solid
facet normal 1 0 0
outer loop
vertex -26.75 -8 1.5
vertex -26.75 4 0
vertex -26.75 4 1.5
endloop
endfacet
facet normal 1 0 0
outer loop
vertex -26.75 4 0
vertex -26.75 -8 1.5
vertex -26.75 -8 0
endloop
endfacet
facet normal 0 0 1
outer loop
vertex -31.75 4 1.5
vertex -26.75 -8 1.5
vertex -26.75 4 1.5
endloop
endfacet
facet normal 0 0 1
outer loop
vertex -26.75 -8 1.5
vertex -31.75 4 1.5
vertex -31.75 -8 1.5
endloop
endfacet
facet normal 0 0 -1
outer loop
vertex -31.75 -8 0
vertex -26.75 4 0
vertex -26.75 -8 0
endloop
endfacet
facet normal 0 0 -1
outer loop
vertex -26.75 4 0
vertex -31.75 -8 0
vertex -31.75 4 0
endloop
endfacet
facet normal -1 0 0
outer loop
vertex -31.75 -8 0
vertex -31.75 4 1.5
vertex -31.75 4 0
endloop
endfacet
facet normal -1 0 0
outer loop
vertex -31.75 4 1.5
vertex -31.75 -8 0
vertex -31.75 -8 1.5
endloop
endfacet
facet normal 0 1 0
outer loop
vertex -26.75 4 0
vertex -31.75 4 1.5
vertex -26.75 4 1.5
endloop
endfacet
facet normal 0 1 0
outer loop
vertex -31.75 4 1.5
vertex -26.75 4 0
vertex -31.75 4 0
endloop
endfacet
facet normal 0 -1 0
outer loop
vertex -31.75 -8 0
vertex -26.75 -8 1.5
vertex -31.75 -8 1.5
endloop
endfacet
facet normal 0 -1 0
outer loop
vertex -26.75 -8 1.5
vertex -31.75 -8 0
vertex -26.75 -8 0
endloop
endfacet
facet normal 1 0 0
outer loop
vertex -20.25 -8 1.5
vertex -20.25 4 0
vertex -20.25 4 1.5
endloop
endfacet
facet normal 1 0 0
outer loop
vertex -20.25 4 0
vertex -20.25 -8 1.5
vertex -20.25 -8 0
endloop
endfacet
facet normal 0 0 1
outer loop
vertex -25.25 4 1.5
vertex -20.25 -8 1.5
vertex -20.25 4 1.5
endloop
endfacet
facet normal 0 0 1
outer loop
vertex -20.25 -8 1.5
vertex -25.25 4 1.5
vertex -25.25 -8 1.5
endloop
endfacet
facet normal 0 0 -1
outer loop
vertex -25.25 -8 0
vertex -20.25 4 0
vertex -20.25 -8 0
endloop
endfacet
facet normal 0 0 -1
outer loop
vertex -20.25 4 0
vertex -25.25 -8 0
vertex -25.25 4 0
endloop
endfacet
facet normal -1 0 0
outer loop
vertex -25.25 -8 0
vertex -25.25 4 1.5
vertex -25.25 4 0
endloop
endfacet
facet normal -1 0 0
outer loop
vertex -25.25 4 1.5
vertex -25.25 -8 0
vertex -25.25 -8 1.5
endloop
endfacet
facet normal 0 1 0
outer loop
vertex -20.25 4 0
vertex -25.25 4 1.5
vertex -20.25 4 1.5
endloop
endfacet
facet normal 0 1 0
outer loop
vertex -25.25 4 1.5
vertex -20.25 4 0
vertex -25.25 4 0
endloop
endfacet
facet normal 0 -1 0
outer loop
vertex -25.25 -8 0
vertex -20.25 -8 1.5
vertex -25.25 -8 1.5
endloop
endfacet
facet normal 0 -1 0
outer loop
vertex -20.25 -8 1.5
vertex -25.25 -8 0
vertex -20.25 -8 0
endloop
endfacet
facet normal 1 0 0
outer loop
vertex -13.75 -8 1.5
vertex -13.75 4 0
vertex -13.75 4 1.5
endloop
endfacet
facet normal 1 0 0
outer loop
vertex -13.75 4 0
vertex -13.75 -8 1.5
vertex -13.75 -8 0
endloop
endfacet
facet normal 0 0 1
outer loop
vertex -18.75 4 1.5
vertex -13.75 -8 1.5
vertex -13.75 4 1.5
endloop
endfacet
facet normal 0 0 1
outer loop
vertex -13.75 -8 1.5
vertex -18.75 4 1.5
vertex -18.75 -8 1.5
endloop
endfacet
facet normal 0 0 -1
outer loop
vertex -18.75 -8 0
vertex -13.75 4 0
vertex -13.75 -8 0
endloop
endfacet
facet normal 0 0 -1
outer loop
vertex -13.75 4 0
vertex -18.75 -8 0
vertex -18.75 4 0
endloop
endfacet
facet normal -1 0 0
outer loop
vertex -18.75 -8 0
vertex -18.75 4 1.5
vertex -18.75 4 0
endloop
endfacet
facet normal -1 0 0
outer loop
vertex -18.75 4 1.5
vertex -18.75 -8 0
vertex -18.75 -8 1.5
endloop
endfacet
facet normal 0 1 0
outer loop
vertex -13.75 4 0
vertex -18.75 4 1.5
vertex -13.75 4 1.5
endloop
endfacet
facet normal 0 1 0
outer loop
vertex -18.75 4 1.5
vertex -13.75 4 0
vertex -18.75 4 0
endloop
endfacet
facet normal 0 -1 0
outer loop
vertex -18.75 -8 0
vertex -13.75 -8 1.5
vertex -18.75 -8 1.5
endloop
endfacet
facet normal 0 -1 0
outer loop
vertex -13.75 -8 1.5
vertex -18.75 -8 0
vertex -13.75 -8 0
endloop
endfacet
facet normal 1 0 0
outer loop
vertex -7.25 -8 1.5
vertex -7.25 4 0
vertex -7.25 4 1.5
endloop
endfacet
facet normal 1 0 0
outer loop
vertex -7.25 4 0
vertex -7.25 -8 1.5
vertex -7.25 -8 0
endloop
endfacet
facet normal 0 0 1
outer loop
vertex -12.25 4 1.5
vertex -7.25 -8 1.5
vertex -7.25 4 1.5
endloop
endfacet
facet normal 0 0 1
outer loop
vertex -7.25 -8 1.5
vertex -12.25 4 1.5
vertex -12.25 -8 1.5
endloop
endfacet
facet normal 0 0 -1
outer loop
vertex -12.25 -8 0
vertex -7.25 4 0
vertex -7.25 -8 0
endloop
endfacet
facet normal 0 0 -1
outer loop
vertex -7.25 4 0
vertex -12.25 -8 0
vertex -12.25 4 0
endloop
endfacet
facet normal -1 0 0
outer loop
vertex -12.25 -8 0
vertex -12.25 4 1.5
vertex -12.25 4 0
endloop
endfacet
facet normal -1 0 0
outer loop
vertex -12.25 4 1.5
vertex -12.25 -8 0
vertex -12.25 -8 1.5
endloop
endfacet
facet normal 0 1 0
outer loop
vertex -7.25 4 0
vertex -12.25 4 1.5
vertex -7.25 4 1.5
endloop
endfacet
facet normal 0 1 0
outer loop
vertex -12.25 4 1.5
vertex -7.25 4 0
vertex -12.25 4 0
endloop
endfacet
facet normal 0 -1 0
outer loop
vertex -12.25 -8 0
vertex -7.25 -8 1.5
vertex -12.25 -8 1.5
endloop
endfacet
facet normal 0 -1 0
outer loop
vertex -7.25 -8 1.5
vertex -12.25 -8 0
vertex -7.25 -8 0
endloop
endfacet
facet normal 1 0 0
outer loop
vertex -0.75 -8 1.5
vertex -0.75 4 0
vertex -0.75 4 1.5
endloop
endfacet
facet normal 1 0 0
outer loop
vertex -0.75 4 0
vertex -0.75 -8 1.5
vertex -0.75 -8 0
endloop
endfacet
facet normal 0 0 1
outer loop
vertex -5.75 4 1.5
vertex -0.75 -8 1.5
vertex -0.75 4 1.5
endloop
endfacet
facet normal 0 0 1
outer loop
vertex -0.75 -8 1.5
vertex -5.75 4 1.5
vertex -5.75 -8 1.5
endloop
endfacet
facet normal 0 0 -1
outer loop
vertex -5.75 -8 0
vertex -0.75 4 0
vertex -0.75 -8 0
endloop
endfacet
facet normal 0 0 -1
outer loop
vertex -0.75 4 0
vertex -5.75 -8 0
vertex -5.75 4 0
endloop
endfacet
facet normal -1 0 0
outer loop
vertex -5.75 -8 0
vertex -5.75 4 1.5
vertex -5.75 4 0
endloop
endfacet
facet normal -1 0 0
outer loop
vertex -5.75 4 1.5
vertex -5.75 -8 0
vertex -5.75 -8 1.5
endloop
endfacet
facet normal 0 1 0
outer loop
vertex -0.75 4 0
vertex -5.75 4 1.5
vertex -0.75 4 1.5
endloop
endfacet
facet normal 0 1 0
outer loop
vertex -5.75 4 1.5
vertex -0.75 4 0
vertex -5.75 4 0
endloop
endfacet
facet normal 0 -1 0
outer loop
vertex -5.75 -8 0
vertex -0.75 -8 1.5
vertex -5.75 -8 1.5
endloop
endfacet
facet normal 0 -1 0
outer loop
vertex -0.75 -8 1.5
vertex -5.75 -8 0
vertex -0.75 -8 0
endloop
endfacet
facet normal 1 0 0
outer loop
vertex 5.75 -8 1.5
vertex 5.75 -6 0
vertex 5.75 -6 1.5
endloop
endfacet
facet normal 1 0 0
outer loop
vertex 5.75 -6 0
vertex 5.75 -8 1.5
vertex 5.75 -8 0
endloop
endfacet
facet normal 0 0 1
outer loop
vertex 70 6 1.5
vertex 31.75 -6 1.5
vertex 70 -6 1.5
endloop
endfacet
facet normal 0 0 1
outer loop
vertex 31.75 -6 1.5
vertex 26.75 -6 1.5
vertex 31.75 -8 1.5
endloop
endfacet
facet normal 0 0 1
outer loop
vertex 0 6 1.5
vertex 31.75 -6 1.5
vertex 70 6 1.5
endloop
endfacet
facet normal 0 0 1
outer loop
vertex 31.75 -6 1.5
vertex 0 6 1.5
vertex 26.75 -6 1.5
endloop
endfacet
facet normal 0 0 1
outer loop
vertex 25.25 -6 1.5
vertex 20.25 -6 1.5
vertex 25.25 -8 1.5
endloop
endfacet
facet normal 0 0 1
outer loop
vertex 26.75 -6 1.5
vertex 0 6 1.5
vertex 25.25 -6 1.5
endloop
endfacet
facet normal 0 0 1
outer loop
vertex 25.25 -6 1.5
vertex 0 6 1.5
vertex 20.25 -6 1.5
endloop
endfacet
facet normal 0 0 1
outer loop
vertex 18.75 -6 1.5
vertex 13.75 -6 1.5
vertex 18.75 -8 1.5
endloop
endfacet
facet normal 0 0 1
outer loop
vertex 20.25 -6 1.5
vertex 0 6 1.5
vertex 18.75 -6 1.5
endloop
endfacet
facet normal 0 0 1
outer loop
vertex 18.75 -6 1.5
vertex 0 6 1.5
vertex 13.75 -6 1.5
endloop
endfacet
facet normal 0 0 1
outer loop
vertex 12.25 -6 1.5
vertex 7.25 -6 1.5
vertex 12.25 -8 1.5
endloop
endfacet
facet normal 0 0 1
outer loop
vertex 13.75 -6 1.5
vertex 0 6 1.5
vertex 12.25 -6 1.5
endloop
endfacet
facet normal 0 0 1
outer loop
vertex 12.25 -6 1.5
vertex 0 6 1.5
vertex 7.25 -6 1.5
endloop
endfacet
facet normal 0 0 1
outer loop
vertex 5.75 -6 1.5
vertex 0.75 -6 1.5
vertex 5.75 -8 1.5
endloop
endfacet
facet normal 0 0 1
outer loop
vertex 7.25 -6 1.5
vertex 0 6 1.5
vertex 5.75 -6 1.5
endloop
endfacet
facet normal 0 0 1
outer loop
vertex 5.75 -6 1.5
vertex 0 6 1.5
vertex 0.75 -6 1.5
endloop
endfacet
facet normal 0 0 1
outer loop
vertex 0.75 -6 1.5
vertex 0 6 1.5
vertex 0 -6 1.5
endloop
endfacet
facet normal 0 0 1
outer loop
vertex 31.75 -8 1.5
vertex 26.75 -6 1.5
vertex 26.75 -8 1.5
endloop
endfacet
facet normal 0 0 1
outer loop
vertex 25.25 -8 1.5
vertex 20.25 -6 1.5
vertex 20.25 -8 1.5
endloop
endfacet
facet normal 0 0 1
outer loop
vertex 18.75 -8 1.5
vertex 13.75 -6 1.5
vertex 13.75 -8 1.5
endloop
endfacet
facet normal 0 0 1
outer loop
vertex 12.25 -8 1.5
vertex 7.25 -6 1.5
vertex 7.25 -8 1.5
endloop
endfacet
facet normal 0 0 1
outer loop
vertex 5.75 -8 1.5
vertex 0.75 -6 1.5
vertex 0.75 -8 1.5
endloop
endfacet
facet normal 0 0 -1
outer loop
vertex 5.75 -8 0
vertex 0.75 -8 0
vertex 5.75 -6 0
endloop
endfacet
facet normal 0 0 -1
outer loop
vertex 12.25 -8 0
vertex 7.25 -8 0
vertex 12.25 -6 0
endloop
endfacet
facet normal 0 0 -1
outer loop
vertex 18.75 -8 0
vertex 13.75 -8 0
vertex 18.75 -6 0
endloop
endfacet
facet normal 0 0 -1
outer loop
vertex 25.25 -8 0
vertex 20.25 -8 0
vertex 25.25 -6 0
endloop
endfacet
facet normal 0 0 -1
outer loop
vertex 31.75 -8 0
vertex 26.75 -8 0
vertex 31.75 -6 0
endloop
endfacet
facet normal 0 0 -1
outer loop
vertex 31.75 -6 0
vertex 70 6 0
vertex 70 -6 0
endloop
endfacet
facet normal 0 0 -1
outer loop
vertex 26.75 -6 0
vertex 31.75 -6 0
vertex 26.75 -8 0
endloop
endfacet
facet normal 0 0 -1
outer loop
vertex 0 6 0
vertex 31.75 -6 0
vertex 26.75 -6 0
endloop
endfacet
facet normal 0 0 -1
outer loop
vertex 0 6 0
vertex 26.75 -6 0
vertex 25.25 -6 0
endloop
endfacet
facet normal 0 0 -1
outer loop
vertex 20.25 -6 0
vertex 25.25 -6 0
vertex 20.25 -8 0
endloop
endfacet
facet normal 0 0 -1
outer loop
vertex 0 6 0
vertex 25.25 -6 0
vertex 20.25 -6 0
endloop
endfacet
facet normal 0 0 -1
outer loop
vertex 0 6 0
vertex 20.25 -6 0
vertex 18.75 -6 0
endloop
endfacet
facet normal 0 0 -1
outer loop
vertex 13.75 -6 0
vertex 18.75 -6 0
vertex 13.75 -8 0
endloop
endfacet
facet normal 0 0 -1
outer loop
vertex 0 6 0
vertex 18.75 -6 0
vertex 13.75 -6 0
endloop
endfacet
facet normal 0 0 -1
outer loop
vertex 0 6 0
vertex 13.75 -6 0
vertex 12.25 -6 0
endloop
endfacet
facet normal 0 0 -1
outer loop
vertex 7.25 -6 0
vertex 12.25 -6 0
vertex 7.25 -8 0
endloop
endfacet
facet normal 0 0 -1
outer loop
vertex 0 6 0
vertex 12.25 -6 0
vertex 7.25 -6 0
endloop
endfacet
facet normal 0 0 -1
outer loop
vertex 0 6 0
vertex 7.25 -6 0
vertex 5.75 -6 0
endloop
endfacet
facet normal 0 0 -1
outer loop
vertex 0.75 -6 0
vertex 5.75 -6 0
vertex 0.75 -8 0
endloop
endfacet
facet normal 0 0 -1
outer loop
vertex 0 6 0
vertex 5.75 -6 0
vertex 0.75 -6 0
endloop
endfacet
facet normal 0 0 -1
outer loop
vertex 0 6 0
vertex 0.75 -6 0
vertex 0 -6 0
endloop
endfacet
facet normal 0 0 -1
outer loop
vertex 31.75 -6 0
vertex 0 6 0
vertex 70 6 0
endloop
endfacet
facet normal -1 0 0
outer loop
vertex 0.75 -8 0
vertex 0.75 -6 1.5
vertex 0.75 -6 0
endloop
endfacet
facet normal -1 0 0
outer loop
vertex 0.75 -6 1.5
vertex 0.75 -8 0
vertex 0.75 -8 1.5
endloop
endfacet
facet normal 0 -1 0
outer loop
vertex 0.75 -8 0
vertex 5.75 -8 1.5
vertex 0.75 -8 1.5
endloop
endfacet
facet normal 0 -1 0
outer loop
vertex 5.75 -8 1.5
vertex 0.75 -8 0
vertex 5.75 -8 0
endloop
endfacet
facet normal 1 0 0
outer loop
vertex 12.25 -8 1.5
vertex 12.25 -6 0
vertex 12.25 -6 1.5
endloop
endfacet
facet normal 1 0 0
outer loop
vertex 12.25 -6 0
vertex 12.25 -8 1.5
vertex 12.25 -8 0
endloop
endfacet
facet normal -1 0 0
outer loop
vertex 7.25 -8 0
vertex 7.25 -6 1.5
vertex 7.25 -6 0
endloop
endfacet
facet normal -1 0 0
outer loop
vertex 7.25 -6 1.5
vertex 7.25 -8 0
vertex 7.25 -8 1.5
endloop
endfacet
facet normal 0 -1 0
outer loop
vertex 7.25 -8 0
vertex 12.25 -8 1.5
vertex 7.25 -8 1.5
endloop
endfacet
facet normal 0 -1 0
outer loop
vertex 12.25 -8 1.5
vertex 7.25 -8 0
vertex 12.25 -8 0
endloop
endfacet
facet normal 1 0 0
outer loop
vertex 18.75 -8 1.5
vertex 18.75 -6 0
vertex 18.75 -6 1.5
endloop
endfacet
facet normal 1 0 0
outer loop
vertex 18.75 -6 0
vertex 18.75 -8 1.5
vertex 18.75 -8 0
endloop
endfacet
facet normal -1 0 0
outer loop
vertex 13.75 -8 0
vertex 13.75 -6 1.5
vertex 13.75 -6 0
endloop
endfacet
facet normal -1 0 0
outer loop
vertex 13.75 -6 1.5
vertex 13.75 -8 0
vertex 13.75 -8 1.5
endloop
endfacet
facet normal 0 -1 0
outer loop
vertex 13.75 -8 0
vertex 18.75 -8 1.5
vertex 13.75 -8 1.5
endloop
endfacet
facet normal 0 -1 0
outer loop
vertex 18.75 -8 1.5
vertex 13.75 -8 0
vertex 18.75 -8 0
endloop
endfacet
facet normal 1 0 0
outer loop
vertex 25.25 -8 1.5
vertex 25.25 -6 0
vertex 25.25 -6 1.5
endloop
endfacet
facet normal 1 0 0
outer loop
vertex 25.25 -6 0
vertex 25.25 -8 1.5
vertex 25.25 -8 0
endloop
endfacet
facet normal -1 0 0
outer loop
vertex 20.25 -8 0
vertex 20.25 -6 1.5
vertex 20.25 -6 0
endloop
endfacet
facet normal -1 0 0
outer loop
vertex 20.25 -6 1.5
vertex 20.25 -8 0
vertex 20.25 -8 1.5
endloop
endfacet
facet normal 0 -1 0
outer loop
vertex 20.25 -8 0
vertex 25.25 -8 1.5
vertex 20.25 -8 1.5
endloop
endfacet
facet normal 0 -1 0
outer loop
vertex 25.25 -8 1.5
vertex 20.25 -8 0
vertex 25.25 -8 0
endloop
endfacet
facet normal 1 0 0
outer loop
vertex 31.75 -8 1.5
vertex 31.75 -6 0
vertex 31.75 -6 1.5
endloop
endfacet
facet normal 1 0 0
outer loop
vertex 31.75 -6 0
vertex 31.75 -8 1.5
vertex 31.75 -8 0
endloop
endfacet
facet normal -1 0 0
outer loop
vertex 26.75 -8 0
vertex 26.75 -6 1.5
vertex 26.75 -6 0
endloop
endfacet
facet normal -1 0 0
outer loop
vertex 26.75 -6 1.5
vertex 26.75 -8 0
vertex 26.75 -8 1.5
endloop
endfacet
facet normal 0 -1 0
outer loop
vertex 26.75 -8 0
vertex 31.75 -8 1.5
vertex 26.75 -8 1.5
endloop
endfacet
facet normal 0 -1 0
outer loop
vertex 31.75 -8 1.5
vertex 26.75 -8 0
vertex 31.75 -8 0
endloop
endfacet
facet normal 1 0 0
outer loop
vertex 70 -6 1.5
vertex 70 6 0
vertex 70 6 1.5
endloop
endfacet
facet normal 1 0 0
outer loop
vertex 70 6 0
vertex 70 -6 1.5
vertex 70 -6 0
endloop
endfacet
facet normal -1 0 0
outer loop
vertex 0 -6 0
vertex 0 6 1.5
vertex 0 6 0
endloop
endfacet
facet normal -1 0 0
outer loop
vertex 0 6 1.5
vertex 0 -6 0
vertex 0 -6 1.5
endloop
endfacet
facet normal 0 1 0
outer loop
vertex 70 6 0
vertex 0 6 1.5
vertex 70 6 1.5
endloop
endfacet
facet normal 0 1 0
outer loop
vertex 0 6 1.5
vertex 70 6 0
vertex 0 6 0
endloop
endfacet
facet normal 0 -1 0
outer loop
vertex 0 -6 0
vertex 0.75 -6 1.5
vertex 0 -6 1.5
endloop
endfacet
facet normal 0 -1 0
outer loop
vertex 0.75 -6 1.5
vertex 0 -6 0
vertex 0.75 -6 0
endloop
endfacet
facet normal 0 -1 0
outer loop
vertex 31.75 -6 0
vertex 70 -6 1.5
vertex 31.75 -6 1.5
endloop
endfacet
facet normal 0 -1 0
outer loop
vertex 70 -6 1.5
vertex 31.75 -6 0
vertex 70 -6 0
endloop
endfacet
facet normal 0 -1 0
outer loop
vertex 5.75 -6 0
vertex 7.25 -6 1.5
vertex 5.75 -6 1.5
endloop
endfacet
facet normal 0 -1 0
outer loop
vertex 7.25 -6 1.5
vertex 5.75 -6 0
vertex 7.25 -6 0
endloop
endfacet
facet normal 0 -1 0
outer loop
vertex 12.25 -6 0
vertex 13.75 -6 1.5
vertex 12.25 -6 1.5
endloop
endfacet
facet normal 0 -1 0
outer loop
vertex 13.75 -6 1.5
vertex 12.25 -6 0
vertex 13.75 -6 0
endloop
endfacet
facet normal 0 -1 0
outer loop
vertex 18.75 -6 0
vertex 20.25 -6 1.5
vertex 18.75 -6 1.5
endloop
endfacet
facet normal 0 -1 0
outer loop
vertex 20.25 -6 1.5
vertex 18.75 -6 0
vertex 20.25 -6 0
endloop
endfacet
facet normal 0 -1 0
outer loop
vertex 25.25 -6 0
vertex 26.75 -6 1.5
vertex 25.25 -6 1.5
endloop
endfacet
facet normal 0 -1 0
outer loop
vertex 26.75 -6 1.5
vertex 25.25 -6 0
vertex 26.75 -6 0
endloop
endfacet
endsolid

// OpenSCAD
// Dimensions for the 10-well agarose gel comb
// All dimensions are in millimetres (mm)

// Overall geometry
plate_thickness = 1.5;      // Thickness of the flat plate (Z)
spine_length = 70.0;       // Length of the spine (X)
spine_width = 12.0;        // Width of the spine (Y)
tooth_width = 5.0;         // Width of each tooth (X)
tooth_length = 12.0;       // Length of each tooth (Y)
tooth_gap = 1.5;           // Gap between neighbouring teeth (X)
tooth_offset = 2.0;        // Distance from spine edge to tooth start (Y)

// Derived dimensions
num_teeth = 10;            // Number of teeth
total_teeth_width = num_teeth * tooth_width + (num_teeth - 1) * tooth_gap;
spine_x_start = -spine_length / 2;
spine_y_start = -spine_width / 2;
tooth_y_start = -spine_width / 2 - tooth_offset;

// Render settings
$fn = 64;                  // High resolution for curved surfaces

// Main Assembly
module gel_comb() {
    union() {
        // 1. The Spine (Back Bar)
        translate([0, spine_y_start, 0])
            cube([spine_length, spine_width, plate_thickness]);

        // 2. The Teeth
        // Loop to create 10 teeth
        for (i = [0 : num_teeth - 1]) {
            // Calculate X position for this tooth
            // Center the row of teeth on the spine
            // The teeth start at 0 relative to the spine center, so we subtract half the total width
            tooth_x_center = (i * (tooth_width + tooth_gap)) - (total_teeth_width / 2);
            
            translate([tooth_x_center, tooth_y_start, 0])
                cube([tooth_width, tooth_length, plate_thickness]);
        }
    }
}

// Render the part
gel_comb();
